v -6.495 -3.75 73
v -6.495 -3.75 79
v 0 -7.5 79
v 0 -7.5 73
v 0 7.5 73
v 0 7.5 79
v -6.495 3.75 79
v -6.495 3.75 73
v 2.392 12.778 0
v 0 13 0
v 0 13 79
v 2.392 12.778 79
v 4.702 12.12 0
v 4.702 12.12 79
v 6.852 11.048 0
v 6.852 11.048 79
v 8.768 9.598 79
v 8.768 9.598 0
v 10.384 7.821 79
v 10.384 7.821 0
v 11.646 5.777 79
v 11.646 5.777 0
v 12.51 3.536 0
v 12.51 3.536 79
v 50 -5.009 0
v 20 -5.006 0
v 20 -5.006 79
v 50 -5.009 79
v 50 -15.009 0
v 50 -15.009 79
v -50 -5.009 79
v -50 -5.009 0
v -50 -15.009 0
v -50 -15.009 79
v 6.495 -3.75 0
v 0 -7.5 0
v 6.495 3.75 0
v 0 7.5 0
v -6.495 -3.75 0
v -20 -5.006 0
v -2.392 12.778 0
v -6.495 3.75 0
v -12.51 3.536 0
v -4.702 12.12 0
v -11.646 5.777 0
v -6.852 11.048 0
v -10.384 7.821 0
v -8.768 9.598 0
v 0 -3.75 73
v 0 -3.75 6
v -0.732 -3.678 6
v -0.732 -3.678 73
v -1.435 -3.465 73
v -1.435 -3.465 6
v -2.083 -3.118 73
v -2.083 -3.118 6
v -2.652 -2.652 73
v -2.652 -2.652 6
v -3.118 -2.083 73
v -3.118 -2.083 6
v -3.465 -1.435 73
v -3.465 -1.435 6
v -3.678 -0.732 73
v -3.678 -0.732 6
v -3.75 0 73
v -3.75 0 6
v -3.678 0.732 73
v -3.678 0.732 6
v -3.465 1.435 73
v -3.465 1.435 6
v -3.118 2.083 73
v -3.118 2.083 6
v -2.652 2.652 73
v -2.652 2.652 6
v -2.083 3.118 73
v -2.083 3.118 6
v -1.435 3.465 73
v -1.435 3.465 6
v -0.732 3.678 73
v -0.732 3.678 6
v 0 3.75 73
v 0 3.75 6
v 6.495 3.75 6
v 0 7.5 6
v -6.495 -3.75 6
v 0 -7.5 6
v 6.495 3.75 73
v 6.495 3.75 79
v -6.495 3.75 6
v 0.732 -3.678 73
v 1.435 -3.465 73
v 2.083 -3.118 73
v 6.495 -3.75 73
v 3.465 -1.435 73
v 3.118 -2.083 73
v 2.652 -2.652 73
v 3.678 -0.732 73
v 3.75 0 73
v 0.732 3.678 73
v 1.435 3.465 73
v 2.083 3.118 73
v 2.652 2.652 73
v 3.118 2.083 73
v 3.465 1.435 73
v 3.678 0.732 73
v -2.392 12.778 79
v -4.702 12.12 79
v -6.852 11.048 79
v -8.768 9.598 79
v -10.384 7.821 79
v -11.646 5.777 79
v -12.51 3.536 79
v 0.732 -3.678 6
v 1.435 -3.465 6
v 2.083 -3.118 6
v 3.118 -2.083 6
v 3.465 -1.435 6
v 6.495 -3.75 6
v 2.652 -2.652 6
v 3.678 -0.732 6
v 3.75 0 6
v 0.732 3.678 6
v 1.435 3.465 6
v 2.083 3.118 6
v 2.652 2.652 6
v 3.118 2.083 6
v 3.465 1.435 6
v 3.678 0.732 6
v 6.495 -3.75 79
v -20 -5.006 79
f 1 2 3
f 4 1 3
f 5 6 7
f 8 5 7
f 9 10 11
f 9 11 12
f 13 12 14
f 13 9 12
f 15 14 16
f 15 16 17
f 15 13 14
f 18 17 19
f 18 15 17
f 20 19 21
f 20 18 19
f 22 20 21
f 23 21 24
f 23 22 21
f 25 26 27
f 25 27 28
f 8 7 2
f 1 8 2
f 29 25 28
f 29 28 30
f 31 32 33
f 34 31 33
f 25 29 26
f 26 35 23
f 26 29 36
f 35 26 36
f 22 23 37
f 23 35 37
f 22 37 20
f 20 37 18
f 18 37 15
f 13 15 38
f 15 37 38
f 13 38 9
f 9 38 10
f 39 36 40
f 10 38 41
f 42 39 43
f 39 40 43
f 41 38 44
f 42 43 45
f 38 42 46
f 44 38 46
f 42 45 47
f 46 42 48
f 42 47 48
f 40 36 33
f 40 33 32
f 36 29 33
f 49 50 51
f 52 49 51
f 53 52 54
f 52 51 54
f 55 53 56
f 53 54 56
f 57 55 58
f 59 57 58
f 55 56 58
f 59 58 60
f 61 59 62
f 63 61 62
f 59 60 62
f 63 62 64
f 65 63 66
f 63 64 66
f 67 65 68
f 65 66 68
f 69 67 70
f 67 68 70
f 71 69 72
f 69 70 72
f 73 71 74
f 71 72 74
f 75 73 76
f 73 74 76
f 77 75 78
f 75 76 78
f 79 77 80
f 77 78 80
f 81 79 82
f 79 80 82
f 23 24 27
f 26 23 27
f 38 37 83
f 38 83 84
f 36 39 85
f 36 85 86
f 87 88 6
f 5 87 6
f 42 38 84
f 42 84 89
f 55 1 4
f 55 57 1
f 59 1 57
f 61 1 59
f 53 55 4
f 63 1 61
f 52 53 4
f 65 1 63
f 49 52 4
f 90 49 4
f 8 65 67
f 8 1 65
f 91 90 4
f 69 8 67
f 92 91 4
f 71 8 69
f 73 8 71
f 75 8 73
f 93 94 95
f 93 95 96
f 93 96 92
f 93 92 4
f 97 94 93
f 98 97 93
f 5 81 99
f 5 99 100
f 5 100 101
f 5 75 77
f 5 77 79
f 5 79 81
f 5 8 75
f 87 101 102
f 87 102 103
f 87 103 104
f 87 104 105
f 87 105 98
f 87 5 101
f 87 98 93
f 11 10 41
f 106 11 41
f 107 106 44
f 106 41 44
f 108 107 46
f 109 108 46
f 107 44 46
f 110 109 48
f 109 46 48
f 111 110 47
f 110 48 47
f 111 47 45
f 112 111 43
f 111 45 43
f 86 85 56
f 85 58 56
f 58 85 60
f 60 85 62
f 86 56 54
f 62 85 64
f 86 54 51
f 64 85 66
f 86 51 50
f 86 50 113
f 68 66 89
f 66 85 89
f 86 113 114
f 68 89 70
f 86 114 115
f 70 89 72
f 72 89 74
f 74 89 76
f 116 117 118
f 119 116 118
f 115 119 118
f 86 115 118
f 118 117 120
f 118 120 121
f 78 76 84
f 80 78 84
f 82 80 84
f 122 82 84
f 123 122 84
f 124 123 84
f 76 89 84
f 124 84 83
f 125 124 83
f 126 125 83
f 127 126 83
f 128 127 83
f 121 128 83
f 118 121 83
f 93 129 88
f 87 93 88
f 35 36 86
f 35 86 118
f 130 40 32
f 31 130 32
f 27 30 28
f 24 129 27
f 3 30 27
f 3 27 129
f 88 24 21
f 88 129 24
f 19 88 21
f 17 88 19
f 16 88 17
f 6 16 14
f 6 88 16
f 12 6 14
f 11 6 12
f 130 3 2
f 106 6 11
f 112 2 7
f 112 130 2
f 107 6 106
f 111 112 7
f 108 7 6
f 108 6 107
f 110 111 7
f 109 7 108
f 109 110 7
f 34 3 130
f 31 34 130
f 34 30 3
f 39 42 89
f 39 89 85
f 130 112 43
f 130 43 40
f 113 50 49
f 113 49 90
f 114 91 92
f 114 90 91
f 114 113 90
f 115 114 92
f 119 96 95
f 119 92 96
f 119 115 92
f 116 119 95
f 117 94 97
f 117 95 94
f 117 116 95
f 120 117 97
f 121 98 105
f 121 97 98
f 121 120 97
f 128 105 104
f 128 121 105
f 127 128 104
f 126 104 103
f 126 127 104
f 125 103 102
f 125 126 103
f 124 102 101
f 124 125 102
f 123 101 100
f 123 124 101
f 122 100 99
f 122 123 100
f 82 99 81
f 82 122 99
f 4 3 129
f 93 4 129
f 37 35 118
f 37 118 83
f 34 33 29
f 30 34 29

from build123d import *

# Parameters (mm, degrees)
EXTRUDE_DEPTH   = 79
POCKET_DEPTH    = 6
POCKET001_DEPTH = 6


with BuildPart() as extrude_pulky:
    # Part__Mirroring → Extrude (new body)
    with BuildSketch(Plane(origin=(-25, -1.004737, 0), x_dir=(0, 1, 0), z_dir=(0, 0, 1))):
        with BuildLine():
            ThreePointArc((14.004737, -25), (11.372036, -17.156587), (4.540257, -12.49))
            Line((4.540257, -12.49), (-4.000791, -5))
            Line((-4.000791, -5), (-4.004737, 25))
            Line((-4.004737, 25), (-14.004737, 25))
            Line((-14.004737, 25), (-14.004737, -25))
            Line((-14.004737, -25), (-2.745263, -25))
            ThreePointArc((-2.745263, -25), (1.004737, -21.25), (4.754737, -25))
            Line((4.754737, -25), (14.004737, -25))
        make_face()
    extrude(amount=EXTRUDE_DEPTH)


with BuildPart() as body001:
    # Part__Mirroring001: instance of Extrude_pulky
    add(extrude_pulky.part.mirror(Plane(origin=(0, 0, 0), x_dir=(0, -1, 0), z_dir=(1, 0, 0))))

    # Fusion: union Extrude_pulky
    add(extrude_pulky.part)

    # Sketch001 → Pocket (cut)
    with BuildSketch(Plane.XY):
        Polygon((0, -7.5), (6.495191, -3.75), (6.495191, 3.75), (0, 7.5), (-6.495191, 3.75), (-6.495191, -3.75), align=None)
    extrude(amount=POCKET_DEPTH, mode=Mode.SUBTRACT)

    # Sketch002 (on Face5 of Pocket) → Pocket001 (cut)
    with BuildSketch(Plane.XY.offset(79)):
        Polygon((0, -7.5), (6.495191, -3.75), (6.495191, 3.75), (0, 7.5), (-6.495191, 3.75), (-6.495191, -3.75), align=None)
    extrude(amount=-POCKET001_DEPTH, mode=Mode.SUBTRACT)


solid = body001.part
